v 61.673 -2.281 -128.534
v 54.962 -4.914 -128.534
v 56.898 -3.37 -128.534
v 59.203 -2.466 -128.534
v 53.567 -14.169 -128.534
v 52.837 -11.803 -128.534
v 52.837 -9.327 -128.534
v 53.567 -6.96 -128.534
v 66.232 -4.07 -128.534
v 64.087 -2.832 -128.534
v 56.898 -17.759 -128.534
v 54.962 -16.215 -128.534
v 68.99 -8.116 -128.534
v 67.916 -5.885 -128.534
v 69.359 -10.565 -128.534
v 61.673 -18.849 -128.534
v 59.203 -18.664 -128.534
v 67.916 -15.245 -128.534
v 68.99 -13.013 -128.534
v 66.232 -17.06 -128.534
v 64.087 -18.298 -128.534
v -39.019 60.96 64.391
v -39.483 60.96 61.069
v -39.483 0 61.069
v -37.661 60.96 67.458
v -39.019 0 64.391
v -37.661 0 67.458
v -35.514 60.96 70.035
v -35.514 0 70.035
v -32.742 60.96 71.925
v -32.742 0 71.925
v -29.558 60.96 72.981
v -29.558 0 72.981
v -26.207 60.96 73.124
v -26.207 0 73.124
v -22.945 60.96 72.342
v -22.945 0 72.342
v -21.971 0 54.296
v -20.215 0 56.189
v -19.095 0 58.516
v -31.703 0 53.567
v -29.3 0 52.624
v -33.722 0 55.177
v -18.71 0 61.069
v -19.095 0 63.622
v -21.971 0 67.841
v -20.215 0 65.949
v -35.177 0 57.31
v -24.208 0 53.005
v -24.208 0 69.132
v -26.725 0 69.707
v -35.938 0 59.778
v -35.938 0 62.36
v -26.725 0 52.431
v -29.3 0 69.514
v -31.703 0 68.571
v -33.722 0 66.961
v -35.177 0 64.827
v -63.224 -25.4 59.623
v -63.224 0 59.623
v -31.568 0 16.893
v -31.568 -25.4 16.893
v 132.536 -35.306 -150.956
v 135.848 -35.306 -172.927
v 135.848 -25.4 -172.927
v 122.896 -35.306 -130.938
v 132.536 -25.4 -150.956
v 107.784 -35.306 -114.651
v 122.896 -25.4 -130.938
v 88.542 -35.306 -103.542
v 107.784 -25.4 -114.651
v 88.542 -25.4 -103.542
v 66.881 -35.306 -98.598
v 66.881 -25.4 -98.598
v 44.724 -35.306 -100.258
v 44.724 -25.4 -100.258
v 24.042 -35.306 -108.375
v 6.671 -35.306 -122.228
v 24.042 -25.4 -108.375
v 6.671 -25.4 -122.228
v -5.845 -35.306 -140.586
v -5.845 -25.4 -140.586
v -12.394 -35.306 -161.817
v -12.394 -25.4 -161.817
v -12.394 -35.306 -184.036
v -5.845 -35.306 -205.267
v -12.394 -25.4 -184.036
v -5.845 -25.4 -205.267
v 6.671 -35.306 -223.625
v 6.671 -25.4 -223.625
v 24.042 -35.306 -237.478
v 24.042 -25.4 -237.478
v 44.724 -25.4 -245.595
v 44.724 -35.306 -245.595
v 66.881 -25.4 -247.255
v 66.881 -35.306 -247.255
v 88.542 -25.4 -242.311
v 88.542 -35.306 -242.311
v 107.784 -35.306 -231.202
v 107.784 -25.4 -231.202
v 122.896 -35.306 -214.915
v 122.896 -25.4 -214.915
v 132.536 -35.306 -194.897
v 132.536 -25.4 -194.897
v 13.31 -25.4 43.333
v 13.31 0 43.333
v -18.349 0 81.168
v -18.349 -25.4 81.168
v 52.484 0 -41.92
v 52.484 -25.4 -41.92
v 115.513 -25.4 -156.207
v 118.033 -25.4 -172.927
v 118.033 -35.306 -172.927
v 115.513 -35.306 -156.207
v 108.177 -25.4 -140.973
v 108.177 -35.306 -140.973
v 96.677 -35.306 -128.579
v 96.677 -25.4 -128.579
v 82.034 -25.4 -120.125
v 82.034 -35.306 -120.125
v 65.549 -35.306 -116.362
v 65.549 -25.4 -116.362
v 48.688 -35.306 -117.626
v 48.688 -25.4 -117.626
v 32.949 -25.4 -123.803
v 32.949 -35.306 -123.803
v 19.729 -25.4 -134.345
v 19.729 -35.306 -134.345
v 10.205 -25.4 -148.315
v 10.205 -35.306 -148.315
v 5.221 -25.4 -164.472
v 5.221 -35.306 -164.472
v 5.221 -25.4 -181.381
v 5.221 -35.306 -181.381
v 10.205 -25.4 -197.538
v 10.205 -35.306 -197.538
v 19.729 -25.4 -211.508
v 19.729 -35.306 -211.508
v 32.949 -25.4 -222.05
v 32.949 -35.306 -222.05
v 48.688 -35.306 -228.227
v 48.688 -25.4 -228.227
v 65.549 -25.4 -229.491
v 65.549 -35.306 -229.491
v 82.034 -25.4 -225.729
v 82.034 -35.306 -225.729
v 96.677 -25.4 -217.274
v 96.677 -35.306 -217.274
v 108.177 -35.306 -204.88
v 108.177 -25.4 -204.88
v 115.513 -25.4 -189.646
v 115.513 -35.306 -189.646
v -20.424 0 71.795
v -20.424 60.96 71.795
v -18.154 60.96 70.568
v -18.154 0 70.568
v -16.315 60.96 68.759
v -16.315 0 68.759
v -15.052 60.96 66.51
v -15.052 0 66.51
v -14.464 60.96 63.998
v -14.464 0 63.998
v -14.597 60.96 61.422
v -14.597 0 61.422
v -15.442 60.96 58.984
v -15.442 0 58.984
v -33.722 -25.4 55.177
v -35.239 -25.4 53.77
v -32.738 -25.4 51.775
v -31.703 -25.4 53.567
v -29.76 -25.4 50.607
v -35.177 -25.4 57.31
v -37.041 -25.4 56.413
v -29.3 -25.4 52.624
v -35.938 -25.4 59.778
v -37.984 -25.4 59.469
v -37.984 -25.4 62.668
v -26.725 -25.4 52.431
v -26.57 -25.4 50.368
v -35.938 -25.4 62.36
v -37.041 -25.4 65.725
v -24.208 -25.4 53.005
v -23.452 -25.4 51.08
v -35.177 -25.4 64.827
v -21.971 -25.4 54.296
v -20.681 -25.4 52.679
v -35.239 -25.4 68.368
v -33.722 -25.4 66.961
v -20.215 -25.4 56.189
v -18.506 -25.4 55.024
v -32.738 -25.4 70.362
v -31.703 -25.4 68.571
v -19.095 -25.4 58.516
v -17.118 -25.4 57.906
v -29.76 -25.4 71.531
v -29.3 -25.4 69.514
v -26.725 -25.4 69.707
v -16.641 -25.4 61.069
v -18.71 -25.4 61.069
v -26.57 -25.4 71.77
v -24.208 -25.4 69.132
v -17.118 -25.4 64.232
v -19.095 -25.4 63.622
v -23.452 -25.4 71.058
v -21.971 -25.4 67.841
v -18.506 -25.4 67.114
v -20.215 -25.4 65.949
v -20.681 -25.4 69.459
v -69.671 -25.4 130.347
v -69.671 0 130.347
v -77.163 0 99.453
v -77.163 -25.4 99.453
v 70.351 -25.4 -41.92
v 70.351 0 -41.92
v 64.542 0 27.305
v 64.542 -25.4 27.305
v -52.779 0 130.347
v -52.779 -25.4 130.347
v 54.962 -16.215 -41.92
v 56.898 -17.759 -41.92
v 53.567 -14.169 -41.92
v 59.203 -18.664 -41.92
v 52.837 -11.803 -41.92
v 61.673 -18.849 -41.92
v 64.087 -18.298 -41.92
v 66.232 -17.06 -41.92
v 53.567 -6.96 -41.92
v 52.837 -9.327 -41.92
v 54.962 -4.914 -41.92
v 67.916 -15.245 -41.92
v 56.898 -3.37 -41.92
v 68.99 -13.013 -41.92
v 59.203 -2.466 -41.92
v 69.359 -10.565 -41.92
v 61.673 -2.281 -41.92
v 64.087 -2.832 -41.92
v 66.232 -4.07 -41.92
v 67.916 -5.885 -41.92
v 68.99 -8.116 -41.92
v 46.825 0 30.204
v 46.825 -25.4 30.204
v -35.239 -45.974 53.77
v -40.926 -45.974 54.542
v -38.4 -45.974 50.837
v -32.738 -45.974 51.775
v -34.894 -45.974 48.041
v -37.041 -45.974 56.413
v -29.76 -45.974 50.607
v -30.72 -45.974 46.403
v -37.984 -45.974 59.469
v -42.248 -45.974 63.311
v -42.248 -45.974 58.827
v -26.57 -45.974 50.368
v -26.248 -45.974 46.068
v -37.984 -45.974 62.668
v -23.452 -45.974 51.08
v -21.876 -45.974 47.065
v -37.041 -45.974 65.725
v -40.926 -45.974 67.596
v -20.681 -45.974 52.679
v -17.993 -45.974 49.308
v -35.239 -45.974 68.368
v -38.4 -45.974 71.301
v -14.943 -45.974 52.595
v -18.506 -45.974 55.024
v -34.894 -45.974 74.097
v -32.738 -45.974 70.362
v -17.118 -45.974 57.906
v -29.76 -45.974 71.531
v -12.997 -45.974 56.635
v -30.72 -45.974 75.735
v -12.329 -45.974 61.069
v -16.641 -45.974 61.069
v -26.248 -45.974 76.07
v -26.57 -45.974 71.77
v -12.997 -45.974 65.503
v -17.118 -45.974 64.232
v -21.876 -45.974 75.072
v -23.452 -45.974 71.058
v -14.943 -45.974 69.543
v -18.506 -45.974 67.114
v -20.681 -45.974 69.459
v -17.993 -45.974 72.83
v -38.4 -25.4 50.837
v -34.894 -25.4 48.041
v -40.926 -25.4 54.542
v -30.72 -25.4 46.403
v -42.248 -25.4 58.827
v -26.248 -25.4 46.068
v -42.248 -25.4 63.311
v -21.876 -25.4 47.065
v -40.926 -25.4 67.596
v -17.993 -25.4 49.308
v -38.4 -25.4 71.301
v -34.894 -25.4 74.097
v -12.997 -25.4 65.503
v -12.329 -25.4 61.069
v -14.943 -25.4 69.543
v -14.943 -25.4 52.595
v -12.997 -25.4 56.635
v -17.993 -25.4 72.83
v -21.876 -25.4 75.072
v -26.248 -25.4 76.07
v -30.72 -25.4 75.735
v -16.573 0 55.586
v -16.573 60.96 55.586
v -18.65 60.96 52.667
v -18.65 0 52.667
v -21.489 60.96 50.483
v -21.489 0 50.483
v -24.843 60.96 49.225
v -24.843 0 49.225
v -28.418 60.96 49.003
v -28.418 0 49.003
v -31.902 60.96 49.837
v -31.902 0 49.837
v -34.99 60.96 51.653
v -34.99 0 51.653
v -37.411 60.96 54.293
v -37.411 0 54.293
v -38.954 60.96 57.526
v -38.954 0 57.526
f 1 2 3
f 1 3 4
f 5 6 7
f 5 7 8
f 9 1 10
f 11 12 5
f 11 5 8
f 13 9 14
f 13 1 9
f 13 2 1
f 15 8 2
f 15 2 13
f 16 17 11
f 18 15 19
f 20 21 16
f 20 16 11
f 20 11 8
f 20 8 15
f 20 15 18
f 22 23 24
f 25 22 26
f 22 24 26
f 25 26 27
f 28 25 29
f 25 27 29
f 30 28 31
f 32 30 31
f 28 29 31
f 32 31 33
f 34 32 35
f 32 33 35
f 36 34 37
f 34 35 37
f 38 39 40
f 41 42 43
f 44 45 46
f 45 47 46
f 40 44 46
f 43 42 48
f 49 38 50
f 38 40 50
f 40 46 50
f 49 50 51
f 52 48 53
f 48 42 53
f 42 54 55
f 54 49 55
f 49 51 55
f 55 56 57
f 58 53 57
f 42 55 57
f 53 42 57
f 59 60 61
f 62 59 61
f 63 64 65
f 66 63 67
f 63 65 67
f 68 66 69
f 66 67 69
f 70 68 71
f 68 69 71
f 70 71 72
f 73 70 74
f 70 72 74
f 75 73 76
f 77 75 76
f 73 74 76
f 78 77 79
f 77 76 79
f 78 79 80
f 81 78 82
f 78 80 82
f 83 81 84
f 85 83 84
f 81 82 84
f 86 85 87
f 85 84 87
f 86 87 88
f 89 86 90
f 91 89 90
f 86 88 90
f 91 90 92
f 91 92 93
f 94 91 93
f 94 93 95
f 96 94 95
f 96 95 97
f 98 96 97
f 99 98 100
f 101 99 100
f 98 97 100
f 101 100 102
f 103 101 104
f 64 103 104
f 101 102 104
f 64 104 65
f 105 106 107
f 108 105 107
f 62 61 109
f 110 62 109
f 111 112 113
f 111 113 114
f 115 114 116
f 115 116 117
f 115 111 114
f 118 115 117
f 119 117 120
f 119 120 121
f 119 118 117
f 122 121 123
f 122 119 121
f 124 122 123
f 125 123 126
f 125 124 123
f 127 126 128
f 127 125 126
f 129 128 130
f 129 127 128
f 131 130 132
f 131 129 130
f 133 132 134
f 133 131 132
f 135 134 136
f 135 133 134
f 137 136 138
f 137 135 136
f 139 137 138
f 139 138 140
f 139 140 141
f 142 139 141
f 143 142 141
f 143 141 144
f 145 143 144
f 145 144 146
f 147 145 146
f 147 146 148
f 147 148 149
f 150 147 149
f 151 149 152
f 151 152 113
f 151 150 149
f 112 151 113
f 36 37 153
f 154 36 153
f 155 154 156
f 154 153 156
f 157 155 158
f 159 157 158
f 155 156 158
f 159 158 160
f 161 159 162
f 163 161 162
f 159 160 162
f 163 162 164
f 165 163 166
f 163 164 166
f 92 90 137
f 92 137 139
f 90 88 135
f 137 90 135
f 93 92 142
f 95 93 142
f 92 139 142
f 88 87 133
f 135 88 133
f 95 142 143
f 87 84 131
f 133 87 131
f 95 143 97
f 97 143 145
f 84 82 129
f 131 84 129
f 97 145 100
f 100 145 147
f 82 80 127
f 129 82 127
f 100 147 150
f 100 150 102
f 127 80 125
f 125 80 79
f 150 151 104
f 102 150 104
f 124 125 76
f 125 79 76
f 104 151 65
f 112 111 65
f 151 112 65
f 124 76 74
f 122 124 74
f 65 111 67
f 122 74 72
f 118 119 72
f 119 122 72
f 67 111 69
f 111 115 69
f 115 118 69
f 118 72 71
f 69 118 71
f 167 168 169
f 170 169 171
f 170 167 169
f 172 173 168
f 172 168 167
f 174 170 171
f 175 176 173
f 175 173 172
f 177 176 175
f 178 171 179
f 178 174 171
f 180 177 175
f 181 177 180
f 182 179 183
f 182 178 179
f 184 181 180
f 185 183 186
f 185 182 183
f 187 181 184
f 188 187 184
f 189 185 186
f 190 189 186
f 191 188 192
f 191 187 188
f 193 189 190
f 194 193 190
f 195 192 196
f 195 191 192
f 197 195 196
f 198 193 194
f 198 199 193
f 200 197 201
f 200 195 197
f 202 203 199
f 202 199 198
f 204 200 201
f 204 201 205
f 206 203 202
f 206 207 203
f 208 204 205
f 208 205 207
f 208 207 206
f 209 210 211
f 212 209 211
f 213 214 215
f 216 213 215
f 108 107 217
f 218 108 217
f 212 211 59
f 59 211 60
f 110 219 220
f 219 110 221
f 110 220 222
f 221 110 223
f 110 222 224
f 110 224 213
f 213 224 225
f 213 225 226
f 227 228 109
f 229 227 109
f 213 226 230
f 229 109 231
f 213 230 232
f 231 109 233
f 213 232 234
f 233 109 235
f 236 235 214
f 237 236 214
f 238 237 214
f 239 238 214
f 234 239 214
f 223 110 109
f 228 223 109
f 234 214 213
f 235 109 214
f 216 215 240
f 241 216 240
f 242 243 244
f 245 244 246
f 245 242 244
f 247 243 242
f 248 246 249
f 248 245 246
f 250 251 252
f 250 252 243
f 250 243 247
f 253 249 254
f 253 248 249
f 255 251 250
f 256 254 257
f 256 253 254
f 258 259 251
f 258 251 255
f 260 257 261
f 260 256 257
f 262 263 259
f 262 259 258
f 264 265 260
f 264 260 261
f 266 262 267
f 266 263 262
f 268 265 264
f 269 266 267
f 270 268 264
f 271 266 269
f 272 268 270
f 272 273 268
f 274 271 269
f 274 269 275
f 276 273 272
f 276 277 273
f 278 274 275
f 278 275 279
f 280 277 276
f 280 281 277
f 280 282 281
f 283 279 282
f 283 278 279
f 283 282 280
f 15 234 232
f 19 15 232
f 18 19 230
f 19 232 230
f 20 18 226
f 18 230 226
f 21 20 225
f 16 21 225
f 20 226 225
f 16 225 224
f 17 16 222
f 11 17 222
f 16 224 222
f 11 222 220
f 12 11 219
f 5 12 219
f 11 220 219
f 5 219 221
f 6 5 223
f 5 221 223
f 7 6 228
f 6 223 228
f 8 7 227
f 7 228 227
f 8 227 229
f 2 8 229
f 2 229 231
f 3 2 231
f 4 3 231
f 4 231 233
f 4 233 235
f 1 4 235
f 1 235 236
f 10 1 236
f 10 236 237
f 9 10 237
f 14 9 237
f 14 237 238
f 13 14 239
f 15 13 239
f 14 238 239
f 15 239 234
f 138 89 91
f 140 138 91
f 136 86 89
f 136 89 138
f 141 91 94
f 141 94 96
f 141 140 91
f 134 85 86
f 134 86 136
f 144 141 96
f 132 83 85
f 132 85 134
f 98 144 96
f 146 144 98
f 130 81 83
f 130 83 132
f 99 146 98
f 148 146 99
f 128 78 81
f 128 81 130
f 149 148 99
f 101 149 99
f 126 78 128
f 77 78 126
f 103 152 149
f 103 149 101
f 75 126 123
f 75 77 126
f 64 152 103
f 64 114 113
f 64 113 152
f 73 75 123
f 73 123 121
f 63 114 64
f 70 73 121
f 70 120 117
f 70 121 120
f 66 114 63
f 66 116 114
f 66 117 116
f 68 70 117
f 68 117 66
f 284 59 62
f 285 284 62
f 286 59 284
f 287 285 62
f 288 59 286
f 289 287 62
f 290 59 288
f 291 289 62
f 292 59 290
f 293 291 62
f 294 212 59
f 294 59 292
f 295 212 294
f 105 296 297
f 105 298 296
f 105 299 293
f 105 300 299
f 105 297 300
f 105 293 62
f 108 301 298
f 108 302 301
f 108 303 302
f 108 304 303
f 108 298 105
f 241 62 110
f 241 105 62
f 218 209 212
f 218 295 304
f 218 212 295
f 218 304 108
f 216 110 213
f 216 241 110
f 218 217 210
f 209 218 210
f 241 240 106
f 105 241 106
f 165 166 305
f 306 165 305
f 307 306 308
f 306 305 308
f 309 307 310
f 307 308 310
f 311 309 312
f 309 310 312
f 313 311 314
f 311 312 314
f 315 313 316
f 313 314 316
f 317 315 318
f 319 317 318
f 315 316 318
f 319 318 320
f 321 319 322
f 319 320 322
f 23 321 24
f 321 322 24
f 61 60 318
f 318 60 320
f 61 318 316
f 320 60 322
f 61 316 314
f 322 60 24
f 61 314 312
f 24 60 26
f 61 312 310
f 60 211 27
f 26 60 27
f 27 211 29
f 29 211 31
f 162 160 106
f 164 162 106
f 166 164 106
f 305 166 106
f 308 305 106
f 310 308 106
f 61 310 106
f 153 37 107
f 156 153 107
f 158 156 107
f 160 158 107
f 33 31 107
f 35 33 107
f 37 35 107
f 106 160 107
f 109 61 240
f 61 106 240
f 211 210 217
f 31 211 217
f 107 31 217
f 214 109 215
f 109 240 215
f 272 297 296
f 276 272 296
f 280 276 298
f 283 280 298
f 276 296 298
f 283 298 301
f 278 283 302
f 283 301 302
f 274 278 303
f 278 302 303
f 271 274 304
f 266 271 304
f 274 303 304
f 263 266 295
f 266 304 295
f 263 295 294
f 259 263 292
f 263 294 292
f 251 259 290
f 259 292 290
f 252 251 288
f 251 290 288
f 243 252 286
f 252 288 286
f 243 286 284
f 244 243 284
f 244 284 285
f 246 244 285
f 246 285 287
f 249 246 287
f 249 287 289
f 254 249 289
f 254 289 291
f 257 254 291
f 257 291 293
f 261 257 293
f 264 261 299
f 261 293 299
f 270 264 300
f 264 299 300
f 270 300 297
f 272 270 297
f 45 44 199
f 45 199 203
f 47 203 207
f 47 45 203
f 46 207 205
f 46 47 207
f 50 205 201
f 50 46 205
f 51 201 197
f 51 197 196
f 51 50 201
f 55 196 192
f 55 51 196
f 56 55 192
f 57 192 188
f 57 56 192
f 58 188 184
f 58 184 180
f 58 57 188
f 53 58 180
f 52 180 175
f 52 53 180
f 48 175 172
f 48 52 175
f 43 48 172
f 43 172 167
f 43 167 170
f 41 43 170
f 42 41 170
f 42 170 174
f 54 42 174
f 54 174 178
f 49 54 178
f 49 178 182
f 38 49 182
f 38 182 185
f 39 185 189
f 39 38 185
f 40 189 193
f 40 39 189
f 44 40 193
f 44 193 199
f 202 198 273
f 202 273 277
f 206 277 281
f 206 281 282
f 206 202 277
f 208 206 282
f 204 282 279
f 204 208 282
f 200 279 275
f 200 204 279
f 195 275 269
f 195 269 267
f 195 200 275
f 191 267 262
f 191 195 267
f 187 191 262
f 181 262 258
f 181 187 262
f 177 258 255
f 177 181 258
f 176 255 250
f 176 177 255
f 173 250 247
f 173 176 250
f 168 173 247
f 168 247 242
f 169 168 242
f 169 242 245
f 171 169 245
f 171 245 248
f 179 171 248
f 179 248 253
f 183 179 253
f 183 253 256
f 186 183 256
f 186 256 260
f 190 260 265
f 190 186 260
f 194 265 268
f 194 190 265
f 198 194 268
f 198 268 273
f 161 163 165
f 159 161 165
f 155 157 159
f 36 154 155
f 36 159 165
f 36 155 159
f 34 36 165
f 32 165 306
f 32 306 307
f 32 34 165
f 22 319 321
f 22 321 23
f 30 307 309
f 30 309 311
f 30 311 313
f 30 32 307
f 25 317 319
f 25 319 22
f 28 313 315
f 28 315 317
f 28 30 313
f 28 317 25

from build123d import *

# Parameters (mm, degrees)
F0_R     = 8.6622611631
F1_DEPTH = 25.4
F3_DEPTH = 60.96
F4_R     = 15.0433700518
F4_R_2   = 10.7311832287
F5_DEPTH = 20.574
F6_R     = 8.3074549113
F7_DEPTH = 86.614
F8_R     = 74.5371885504
F8_R_2   = 56.7230556975
F9_DEPTH = 9.906


with BuildPart() as f1:
    # F0 (on Front) → F1 (new body)
    with BuildSketch(Plane.XZ):
        Polygon((64.5420327783, 27.3047611117), (46.8248836696, 30.204096809), (52.4840392172, -41.9203862548), (70.3510344028, -41.9203862548), align=None)
        Polygon((52.4840392172, -41.9203862548), (46.8248836696, 30.204096809), (13.3099230006, 43.3333665133), (-18.349474296, 81.1676234007), (-52.7794659138, 130.3466409445), (-69.670855999, 130.3466409445), (-77.1632641554, 99.4534641504), (-63.224196434, 59.6231296659), (-31.5679907799, 16.8934687972), align=None)
        with Locations((-27.3722410202, 61.0688850284)):
            Circle(F0_R, mode=Mode.SUBTRACT)
    extrude(amount=F1_DEPTH)

    # F2 (on face) → F3 (join)
    with BuildSketch(Plane(origin=(0, 0, 0), x_dir=(-1, 0, 0), z_dir=(0, 1, 0))):
        with BuildLine():
            ThreePointArc((15.4417673277, 58.984396686), (28.418395355, 49.0029472163), (39.483446335, 61.0688850284))
            ThreePointArc((39.483446335, 61.0688850284), (34.1934272036, 71.0765177768), (22.9445948127, 72.3417392915))
            ThreePointArc((22.9445948127, 72.3417392915), (29.8672294993, 69.9078012829), (32.7983092404, 63.180565834))
            ThreePointArc((32.7983092404, 63.180565834), (25.7713288184, 54.2522767667), (15.4417673277, 58.984396686))
        make_face()
        with BuildLine():
            ThreePointArc((32.7983092404, 63.180565834), (29.8672294993, 69.9078012829), (22.9445948127, 72.3417392915))
            ThreePointArc((22.9445948127, 72.3417392915), (16.8128058063, 67.0001262257), (15.4417673277, 58.984396686))
            ThreePointArc((15.4417673277, 58.984396686), (25.7713288184, 54.2522767667), (32.7983092404, 63.180565834))
        make_face()
        with BuildLine():
            ThreePointArc((15.4417673277, 58.984396686), (16.8128058063, 67.0001262257), (22.9445948127, 72.3417392915))
            ThreePointArc((22.9445948127, 72.3417392915), (15.6041991141, 67.6790013416), (15.4417673277, 58.984396686))
        make_face()
    extrude(amount=F3_DEPTH)

    # F4 (on face) → F5 (join)
    with BuildSketch(Plane.XZ.offset(25.4)):
        with Locations((-27.3722410202, 61.0688850284)):
            Circle(F4_R)
        with Locations((-27.3722410202, 61.0688850284)):
            Circle(F4_R_2, mode=Mode.SUBTRACT)
    extrude(amount=F5_DEPTH)

    # F6 (on face) → F7 (join)
    with BuildSketch(Plane(origin=(0, 0, -41.9203862548), x_dir=(1, 0, 0), z_dir=(0, 0, -1))):
        with Locations((61.0519275069, 10.5647565797)):
            Circle(F6_R)
    extrude(amount=F7_DEPTH)


with BuildPart() as f9:
    # F8 (on face) → F9 (new body)
    with BuildSketch(Plane.XZ.offset(25.4)):
        with Locations((61.3104067743, -172.9265898466)):
            Circle(F8_R)
        with Locations((61.3104067743, -172.9265898466)):
            Circle(F8_R_2, mode=Mode.SUBTRACT)
    extrude(amount=F9_DEPTH)


solid = Compound([f1.part, f9.part])
